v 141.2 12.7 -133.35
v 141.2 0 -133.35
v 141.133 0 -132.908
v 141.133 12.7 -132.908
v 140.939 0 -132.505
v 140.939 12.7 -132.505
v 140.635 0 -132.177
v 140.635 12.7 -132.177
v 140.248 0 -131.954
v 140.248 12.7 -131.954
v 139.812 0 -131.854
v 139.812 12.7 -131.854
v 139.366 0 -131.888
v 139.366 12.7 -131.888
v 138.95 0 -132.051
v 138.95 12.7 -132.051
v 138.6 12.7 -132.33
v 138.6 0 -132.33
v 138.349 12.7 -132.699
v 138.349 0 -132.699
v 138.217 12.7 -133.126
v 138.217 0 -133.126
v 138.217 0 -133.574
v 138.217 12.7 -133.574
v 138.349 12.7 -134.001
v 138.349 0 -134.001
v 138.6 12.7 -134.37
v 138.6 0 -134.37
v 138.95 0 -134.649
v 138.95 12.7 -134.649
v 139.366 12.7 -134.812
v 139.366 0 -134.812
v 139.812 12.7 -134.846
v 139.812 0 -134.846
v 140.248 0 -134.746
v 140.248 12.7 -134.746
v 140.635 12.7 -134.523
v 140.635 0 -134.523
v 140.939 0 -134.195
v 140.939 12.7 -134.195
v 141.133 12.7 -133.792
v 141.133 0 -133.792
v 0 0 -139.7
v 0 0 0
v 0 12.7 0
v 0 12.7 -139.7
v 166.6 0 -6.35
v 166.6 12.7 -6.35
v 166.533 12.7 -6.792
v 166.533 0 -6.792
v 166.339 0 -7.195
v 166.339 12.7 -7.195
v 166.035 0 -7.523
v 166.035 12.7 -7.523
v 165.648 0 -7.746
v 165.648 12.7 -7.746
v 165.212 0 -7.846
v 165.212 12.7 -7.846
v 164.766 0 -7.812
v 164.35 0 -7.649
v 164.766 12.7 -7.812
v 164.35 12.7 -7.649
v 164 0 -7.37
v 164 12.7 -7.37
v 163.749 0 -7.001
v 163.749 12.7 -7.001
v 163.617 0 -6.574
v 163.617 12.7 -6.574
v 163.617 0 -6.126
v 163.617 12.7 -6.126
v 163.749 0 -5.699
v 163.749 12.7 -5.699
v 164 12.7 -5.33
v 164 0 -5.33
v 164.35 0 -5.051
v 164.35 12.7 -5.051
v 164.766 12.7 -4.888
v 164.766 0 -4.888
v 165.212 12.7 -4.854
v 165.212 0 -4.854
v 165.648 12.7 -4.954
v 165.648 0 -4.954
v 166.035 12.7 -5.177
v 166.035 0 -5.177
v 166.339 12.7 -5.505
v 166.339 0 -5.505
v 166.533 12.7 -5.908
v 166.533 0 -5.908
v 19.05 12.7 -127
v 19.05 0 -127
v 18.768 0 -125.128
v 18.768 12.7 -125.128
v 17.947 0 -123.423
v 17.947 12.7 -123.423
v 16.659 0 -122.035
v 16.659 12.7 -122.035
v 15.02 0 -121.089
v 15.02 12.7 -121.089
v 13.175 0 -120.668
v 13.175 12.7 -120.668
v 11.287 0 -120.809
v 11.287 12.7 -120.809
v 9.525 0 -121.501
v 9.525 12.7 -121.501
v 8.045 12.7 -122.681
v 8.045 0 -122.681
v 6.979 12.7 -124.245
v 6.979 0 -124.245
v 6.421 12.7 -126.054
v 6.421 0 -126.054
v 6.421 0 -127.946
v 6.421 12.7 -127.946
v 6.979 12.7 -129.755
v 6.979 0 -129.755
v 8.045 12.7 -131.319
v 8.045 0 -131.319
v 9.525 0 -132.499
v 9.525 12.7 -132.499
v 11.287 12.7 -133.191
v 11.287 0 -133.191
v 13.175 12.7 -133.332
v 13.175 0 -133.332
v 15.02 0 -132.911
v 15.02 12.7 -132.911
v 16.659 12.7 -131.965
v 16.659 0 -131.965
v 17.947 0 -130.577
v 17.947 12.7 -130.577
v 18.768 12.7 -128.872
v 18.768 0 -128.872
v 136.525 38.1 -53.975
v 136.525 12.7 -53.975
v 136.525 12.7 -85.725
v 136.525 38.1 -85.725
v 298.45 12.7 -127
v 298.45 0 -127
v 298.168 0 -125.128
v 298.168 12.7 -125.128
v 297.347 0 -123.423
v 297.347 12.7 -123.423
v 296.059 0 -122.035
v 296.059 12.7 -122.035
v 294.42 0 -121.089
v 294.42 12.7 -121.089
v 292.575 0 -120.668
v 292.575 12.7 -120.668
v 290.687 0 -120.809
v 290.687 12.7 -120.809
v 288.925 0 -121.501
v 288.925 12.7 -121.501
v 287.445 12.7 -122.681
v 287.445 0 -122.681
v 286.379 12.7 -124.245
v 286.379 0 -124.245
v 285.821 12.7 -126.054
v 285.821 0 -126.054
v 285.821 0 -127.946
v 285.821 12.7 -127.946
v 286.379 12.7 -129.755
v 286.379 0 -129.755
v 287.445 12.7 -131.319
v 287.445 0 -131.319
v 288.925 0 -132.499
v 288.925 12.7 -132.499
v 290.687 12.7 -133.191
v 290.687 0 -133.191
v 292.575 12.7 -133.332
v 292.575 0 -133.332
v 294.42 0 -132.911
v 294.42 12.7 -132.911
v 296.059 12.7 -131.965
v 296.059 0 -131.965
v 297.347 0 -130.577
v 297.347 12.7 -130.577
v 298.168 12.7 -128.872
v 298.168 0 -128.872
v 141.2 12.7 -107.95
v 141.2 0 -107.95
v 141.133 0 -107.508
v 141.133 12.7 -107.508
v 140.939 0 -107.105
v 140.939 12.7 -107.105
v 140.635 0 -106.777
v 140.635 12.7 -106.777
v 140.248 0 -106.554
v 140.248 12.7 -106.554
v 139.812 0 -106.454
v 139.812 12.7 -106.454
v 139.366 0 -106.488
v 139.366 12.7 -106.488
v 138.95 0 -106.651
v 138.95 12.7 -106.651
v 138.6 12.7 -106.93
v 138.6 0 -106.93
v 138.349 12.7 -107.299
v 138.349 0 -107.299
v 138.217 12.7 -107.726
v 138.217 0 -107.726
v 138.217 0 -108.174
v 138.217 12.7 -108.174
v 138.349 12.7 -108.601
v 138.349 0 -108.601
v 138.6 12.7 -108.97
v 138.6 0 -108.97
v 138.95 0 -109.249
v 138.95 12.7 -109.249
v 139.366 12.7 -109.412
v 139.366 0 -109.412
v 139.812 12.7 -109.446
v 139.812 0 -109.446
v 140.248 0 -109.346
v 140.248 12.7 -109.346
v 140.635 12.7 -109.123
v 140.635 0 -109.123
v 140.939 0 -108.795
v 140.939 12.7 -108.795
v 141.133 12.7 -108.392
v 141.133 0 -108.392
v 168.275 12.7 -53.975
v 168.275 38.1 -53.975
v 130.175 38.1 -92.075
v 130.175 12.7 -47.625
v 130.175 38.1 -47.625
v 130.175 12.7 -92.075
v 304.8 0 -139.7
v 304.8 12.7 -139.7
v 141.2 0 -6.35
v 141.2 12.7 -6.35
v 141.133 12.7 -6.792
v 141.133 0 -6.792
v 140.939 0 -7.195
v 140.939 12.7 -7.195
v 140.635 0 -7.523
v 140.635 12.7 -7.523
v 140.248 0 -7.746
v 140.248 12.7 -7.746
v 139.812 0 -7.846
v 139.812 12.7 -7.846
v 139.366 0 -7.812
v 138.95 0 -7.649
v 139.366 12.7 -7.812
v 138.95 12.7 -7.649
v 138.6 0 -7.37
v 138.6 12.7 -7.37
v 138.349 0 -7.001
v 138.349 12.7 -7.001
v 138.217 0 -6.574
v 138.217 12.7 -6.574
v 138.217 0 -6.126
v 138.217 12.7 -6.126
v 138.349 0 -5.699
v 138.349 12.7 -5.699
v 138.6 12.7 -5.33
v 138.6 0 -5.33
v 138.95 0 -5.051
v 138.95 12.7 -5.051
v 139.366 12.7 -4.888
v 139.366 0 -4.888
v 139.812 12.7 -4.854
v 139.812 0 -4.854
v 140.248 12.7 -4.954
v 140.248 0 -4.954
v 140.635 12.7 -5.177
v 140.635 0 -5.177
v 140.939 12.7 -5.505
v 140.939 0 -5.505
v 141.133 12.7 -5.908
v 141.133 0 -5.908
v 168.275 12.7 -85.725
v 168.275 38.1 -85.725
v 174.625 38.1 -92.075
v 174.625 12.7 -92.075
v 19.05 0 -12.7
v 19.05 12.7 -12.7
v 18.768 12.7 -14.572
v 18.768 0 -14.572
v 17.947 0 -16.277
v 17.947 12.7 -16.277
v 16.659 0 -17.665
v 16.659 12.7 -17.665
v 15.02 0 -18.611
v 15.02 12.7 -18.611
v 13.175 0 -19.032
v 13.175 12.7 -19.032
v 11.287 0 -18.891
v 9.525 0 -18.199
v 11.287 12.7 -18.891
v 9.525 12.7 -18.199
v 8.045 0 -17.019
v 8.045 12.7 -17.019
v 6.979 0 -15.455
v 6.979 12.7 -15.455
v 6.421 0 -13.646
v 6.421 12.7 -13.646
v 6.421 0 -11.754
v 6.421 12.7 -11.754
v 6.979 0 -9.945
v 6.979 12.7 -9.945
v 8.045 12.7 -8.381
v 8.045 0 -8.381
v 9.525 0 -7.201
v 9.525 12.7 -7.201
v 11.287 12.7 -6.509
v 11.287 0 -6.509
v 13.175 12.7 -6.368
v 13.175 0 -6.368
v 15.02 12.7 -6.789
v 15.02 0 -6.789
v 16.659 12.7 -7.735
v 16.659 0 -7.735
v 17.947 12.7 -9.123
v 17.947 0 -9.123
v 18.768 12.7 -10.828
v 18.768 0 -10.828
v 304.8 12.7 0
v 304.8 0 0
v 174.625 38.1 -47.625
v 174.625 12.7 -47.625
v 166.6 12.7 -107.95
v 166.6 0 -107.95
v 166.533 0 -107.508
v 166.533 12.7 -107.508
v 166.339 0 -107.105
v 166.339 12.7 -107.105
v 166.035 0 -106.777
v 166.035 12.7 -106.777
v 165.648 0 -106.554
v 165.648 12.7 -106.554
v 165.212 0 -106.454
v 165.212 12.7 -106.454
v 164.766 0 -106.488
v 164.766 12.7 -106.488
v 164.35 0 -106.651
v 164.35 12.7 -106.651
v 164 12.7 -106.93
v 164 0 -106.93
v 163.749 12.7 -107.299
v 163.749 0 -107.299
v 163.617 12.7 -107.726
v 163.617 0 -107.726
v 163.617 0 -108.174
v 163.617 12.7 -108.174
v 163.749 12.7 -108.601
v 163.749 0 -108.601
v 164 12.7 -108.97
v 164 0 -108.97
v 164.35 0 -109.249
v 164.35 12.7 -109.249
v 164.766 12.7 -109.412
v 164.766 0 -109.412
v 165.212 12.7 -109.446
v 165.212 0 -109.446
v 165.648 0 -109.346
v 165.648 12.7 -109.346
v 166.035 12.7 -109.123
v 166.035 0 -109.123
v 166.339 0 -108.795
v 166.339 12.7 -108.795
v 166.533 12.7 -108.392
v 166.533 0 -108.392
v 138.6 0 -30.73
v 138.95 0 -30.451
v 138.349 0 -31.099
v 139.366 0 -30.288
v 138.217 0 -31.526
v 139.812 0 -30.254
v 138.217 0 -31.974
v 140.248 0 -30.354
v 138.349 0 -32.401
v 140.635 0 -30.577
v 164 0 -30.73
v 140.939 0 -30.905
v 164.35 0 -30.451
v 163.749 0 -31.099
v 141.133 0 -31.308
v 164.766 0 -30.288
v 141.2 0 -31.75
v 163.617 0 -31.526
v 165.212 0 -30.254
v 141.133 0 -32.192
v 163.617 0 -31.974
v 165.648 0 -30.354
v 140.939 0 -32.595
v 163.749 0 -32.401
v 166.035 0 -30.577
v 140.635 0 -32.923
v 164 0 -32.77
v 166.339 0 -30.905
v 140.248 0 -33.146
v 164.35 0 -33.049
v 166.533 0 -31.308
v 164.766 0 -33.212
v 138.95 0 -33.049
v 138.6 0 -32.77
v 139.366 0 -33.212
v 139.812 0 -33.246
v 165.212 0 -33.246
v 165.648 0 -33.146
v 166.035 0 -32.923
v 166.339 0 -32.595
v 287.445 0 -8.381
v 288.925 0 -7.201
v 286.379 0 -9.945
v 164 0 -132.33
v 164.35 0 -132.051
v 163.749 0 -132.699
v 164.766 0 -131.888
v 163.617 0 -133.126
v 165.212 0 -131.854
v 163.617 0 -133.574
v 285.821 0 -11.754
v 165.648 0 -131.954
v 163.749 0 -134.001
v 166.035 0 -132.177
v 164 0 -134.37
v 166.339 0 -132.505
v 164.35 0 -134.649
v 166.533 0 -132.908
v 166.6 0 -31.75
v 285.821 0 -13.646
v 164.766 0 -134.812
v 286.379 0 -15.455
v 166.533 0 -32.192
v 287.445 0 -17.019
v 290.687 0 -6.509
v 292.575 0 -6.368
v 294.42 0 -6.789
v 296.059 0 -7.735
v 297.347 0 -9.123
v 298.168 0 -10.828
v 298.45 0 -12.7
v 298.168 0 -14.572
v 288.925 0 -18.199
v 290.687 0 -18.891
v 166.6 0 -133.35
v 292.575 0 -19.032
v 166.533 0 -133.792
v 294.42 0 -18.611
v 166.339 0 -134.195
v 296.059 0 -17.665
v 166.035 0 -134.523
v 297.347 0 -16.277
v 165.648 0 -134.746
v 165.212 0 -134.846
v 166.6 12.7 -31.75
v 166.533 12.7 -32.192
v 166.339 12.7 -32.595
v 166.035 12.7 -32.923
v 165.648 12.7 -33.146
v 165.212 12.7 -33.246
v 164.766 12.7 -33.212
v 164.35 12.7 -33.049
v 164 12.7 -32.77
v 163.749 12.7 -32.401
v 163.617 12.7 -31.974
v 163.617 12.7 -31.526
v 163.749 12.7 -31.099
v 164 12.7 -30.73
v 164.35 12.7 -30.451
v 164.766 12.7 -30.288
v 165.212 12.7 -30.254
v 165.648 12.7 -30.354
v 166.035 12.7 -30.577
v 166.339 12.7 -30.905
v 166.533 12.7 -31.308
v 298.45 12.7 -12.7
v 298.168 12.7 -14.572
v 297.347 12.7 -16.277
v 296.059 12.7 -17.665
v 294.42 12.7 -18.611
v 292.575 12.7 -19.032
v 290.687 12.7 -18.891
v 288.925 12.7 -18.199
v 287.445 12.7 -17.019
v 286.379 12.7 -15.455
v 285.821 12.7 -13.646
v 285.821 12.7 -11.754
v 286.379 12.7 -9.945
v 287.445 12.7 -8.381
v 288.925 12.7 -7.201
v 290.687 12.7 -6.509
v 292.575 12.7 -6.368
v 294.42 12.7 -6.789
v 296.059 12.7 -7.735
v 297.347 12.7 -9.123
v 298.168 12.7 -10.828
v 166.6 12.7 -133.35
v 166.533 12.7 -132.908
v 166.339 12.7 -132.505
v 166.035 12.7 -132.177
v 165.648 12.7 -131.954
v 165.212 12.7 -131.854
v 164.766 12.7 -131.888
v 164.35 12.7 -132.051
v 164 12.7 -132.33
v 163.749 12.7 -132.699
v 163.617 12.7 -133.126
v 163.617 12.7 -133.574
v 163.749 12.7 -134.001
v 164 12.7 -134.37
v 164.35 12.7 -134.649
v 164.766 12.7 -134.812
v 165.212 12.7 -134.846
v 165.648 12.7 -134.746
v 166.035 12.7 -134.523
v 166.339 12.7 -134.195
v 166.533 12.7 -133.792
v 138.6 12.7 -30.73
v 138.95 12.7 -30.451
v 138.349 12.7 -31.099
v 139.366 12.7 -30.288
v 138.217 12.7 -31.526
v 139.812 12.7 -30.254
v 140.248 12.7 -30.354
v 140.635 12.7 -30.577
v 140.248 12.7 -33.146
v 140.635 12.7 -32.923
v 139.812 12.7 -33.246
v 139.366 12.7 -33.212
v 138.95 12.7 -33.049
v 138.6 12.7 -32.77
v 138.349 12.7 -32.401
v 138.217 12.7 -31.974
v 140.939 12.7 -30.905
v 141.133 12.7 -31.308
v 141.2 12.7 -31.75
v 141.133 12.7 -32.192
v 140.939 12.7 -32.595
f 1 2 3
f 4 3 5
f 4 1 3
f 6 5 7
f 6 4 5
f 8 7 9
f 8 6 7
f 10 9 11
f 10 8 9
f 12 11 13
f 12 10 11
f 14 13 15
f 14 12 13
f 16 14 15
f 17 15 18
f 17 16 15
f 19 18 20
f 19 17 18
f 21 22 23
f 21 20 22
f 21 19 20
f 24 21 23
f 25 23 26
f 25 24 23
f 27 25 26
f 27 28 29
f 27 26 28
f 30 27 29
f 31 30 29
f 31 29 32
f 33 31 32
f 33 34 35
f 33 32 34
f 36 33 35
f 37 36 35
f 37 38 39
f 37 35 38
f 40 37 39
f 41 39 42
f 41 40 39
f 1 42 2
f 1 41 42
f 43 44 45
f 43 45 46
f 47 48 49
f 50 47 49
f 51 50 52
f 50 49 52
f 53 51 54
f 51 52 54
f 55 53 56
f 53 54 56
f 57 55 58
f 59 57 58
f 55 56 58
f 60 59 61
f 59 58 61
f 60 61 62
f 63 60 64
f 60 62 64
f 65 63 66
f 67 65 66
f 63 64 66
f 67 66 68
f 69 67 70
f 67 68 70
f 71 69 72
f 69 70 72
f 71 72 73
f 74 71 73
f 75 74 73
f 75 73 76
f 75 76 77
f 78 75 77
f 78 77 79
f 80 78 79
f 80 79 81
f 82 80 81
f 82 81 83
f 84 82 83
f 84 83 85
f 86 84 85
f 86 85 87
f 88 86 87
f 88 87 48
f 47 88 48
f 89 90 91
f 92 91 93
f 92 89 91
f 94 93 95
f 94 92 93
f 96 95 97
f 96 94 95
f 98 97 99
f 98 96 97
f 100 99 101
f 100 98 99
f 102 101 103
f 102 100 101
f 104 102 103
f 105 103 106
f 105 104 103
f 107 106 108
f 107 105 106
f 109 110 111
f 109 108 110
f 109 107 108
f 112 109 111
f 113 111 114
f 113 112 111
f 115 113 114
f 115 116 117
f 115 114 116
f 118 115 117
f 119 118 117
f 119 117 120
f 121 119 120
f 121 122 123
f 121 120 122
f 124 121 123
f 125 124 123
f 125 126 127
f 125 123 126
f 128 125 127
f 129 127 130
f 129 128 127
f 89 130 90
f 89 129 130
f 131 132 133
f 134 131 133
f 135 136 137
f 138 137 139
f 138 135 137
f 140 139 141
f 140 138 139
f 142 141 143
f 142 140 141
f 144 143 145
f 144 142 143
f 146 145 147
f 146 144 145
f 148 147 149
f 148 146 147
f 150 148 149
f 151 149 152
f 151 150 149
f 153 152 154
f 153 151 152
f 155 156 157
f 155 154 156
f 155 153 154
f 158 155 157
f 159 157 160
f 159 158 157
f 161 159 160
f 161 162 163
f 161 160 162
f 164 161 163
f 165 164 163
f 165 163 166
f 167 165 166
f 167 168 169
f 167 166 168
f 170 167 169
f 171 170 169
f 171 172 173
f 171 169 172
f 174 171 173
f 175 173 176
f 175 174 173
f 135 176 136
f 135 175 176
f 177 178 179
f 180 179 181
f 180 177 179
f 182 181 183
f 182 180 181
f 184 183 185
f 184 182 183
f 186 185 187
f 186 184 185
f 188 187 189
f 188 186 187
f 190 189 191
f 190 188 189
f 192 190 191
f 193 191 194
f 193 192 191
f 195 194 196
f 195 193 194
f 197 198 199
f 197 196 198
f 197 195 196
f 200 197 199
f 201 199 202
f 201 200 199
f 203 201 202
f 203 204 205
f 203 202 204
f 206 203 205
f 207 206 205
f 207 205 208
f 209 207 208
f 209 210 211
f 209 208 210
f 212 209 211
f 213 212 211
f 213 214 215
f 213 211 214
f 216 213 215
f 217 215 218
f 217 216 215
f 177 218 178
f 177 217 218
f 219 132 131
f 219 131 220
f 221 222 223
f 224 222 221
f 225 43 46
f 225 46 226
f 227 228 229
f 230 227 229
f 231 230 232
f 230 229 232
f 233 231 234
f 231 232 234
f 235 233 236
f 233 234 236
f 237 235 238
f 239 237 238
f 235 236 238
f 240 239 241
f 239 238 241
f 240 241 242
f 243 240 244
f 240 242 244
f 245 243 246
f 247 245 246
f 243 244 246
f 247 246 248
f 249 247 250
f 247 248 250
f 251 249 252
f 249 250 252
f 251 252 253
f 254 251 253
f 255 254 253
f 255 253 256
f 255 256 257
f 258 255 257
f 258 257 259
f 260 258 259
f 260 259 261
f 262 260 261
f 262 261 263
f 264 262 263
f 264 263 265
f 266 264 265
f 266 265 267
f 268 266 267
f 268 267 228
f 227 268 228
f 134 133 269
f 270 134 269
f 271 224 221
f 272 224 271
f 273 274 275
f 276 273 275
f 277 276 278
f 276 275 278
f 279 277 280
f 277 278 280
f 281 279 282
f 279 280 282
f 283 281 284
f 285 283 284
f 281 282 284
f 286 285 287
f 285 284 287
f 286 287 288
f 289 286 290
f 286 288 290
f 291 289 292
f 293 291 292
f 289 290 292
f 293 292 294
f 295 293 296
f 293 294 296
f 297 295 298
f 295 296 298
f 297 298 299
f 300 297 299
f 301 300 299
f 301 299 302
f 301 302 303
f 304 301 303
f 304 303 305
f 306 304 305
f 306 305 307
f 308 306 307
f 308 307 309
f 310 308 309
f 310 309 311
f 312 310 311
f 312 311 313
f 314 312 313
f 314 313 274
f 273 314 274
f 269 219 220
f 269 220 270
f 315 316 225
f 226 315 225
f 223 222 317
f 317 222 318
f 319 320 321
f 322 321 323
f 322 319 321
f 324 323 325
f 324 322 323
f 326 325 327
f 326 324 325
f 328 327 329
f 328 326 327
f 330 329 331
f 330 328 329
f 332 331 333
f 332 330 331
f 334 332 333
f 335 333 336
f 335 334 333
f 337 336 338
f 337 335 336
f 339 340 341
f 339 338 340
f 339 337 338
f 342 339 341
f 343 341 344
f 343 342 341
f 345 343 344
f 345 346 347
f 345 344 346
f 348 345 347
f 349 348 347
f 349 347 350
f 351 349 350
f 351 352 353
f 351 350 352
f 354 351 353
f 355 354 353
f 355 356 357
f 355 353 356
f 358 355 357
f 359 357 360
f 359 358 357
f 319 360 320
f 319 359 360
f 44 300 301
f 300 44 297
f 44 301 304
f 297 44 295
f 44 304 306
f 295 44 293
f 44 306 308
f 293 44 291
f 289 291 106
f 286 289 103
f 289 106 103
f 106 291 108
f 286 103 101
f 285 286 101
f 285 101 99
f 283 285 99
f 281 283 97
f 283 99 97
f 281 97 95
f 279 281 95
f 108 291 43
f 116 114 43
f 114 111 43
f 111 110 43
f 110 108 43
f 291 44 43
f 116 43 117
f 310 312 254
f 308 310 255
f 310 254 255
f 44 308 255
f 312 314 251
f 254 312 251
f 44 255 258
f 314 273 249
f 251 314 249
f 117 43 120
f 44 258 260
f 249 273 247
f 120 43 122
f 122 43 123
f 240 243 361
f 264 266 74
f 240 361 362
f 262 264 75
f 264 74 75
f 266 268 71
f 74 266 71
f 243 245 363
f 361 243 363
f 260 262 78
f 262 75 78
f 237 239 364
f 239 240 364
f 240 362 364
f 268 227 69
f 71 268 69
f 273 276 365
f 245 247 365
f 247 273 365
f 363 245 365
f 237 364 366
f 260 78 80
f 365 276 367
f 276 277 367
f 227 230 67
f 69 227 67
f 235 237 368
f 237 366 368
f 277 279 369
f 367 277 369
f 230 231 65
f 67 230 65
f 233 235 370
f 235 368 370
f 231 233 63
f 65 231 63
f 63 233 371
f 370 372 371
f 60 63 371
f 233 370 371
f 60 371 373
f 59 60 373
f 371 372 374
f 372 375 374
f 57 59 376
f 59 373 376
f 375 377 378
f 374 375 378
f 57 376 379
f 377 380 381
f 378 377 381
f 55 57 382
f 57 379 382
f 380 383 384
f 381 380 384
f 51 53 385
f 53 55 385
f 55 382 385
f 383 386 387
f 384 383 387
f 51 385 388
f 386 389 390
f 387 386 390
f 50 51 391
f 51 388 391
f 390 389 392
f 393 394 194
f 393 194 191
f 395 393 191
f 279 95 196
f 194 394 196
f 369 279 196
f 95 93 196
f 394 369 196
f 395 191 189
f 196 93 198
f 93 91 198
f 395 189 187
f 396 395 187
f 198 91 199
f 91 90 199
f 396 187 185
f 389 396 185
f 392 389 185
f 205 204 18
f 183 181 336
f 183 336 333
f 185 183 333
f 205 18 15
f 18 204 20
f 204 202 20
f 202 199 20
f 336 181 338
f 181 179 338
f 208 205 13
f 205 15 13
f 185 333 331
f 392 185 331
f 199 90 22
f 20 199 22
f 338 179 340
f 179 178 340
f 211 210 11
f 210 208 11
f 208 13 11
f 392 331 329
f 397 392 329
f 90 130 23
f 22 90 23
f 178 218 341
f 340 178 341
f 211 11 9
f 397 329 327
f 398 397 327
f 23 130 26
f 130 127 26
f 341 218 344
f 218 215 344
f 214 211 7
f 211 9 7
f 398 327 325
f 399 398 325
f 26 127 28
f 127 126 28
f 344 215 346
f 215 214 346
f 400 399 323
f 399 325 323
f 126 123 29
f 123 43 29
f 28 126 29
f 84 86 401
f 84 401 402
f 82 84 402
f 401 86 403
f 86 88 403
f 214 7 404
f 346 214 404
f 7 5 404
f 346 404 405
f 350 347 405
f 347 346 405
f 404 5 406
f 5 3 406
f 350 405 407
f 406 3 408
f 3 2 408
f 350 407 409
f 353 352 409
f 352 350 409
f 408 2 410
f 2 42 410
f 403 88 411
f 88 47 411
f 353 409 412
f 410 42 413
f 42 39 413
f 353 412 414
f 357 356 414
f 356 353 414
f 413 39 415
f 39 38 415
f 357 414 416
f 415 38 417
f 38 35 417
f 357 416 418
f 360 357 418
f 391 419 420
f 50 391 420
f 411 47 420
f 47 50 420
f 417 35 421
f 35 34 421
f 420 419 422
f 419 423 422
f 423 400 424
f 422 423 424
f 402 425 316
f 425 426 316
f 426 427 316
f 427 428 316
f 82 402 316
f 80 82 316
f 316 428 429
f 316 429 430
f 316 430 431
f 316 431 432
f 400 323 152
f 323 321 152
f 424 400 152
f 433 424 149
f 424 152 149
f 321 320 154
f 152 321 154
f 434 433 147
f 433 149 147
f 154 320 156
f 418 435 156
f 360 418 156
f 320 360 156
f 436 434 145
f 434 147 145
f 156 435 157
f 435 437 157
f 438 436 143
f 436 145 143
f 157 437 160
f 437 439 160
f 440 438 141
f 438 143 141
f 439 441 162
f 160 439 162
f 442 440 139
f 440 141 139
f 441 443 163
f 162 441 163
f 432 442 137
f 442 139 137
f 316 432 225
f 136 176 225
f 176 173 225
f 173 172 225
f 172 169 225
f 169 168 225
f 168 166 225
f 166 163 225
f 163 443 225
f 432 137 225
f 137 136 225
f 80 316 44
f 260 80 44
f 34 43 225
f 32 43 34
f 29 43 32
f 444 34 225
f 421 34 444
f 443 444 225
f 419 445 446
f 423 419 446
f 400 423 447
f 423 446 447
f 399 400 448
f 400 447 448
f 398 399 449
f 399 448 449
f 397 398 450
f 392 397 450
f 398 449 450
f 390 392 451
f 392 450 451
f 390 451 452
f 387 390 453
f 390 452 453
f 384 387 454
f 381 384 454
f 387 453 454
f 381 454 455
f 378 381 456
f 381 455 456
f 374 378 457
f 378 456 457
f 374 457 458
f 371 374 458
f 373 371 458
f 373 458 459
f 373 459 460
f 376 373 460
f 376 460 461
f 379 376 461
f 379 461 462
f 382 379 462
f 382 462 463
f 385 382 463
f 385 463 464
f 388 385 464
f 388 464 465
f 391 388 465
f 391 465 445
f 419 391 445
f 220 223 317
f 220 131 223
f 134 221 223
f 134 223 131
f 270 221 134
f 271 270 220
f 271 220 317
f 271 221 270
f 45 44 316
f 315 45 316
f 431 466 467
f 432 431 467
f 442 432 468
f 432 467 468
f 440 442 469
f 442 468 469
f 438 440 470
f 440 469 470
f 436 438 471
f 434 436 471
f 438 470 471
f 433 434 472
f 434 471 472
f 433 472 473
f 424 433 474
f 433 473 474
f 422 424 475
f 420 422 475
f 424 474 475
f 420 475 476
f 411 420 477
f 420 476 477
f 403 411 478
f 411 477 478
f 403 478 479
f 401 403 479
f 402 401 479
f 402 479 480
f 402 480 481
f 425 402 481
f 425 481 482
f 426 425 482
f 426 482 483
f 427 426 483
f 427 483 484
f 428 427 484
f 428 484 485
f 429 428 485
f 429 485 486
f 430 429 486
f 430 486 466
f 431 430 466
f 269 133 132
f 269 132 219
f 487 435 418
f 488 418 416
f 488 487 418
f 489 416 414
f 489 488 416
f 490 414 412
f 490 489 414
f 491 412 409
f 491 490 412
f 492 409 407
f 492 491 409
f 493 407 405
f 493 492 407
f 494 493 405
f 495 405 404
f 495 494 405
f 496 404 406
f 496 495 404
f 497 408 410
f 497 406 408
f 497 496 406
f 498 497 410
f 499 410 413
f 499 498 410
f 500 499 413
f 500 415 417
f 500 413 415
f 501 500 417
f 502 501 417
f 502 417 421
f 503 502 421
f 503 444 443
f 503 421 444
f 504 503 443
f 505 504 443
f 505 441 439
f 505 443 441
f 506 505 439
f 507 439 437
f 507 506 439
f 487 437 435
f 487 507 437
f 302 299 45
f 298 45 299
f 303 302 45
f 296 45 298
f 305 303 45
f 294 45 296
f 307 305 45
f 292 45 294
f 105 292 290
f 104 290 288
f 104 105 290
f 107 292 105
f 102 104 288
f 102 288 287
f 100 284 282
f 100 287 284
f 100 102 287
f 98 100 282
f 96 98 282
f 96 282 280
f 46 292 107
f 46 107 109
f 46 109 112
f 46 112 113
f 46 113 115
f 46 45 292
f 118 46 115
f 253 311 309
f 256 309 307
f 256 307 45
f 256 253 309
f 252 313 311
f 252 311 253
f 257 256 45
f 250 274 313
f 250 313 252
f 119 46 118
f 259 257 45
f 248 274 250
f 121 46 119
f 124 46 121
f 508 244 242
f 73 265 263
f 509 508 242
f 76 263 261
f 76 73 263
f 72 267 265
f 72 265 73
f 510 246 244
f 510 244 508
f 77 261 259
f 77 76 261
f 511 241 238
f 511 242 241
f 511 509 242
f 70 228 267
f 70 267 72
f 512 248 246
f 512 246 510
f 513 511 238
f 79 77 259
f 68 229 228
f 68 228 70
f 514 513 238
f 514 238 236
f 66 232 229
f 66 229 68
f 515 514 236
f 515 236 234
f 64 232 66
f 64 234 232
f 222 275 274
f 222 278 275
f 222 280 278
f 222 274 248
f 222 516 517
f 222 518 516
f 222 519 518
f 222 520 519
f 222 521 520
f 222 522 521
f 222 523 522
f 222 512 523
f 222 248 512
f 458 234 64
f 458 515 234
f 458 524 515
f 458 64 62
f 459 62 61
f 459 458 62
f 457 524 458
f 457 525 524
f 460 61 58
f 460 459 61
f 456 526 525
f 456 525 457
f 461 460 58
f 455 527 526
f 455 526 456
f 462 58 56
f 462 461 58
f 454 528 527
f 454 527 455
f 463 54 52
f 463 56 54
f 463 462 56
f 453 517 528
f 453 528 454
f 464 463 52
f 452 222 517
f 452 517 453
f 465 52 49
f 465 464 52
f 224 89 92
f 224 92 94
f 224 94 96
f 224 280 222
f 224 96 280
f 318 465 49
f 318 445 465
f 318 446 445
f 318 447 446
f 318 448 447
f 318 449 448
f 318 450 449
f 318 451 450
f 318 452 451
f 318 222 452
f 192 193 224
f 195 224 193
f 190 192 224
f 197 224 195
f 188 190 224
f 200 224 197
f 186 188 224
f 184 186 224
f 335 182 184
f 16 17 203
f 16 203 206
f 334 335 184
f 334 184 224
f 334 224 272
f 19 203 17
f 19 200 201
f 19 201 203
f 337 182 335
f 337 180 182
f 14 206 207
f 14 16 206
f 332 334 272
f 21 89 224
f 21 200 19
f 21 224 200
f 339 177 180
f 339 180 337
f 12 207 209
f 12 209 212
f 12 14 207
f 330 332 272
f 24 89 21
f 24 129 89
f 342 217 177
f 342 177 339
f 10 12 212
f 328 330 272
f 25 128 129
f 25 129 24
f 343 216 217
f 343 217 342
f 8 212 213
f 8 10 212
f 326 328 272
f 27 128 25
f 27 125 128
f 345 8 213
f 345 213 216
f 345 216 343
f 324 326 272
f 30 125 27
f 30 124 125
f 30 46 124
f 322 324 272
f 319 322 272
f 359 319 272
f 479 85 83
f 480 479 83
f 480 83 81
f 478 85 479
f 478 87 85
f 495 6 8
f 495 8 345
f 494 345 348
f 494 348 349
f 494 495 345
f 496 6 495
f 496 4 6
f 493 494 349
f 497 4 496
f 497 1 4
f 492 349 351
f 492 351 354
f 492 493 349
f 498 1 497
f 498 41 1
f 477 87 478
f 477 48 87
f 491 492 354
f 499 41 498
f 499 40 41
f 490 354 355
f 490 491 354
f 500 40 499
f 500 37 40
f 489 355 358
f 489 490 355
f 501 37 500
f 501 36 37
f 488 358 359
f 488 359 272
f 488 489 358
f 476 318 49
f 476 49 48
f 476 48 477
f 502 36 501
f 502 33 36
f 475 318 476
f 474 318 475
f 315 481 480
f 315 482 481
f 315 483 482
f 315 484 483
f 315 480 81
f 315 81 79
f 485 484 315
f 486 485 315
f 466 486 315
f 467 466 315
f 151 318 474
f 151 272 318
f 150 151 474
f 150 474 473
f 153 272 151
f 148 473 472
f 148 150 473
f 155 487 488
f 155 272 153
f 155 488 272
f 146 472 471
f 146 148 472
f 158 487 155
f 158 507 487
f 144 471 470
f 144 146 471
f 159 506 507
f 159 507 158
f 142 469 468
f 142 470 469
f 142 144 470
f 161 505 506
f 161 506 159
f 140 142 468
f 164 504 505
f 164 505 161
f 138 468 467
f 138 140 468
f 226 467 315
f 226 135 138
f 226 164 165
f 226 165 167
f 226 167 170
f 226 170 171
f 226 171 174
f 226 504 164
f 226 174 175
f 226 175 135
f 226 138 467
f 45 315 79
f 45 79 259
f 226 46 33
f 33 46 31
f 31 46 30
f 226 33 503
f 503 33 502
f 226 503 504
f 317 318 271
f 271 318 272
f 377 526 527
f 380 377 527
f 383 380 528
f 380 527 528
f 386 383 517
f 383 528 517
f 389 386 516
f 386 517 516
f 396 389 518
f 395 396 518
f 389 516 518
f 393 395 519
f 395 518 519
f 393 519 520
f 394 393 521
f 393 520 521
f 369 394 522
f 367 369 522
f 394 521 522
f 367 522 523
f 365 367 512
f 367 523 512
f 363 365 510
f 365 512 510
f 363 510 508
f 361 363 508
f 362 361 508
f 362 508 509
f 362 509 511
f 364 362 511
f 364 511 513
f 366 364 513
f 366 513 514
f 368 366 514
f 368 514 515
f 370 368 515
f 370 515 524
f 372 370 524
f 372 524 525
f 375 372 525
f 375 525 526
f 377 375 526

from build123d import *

# Parameters (mm, degrees)
SKETCH1_W           = 304.8
SKETCH1_H           = 139.7
BOSS_EXTRUDE1_DEPTH = 12.7
SKETCH5_R           = 1.5
SKETCH5_R_2         = 6.35
CUT_EXTRUDE2_DEPTH  = 13.7
SKETCH8_W           = 44.45
SKETCH8_H           = 44.45
SKETCH8_W_2         = 31.75
SKETCH8_H_2         = 31.75
BOSS_EXTRUDE3_DEPTH = 25.4


with BuildPart() as part:
    # Sketch1 → Boss-Extrude1 (new body)
    with BuildSketch(Plane(origin=(0, 0, 0), x_dir=(1, 0, 0), z_dir=(0, 1, 0))):
        with Locations((152.4, 69.85)):
            Rectangle(SKETCH1_W, SKETCH1_H)
    extrude(amount=BOSS_EXTRUDE1_DEPTH)

    # Sketch5 → Cut-Extrude2 (cut, through all)
    with BuildSketch(Plane(origin=(0, 12.7, 0), x_dir=(1, 0, 0), z_dir=(0, 1, 0))):
        with Locations((165.1, 6.35)):
            Circle(SKETCH5_R)
        with Locations((165.1, 31.75)):
            Circle(SKETCH5_R)
        with Locations((139.7, 31.75)):
            Circle(SKETCH5_R)
        with Locations((12.7, 12.7)):
            Circle(SKETCH5_R_2)
        with Locations((139.7, 6.35)):
            Circle(SKETCH5_R)
        with Locations((292.1, 12.7)):
            Circle(SKETCH5_R_2)
    cut_extrude2 = extrude(amount=-CUT_EXTRUDE2_DEPTH, mode=Mode.SUBTRACT)

    # Sketch8 → Boss-Extrude3 (add)
    with BuildSketch(Plane(origin=(0, 12.7, 0), x_dir=(1, 0, 0), z_dir=(0, 1, 0))):
        with Locations((152.4, 69.85)):
            Rectangle(SKETCH8_W, SKETCH8_H)
        with Locations((152.4, 69.85)):
            Rectangle(SKETCH8_W_2, SKETCH8_H_2, mode=Mode.SUBTRACT)
    extrude(amount=BOSS_EXTRUDE3_DEPTH)

    # Mirror1: Cut-Extrude2 across plane
    add(cut_extrude2.mirror(Plane.XY.offset(-69.85)), mode=Mode.SUBTRACT)


solid = part.part
